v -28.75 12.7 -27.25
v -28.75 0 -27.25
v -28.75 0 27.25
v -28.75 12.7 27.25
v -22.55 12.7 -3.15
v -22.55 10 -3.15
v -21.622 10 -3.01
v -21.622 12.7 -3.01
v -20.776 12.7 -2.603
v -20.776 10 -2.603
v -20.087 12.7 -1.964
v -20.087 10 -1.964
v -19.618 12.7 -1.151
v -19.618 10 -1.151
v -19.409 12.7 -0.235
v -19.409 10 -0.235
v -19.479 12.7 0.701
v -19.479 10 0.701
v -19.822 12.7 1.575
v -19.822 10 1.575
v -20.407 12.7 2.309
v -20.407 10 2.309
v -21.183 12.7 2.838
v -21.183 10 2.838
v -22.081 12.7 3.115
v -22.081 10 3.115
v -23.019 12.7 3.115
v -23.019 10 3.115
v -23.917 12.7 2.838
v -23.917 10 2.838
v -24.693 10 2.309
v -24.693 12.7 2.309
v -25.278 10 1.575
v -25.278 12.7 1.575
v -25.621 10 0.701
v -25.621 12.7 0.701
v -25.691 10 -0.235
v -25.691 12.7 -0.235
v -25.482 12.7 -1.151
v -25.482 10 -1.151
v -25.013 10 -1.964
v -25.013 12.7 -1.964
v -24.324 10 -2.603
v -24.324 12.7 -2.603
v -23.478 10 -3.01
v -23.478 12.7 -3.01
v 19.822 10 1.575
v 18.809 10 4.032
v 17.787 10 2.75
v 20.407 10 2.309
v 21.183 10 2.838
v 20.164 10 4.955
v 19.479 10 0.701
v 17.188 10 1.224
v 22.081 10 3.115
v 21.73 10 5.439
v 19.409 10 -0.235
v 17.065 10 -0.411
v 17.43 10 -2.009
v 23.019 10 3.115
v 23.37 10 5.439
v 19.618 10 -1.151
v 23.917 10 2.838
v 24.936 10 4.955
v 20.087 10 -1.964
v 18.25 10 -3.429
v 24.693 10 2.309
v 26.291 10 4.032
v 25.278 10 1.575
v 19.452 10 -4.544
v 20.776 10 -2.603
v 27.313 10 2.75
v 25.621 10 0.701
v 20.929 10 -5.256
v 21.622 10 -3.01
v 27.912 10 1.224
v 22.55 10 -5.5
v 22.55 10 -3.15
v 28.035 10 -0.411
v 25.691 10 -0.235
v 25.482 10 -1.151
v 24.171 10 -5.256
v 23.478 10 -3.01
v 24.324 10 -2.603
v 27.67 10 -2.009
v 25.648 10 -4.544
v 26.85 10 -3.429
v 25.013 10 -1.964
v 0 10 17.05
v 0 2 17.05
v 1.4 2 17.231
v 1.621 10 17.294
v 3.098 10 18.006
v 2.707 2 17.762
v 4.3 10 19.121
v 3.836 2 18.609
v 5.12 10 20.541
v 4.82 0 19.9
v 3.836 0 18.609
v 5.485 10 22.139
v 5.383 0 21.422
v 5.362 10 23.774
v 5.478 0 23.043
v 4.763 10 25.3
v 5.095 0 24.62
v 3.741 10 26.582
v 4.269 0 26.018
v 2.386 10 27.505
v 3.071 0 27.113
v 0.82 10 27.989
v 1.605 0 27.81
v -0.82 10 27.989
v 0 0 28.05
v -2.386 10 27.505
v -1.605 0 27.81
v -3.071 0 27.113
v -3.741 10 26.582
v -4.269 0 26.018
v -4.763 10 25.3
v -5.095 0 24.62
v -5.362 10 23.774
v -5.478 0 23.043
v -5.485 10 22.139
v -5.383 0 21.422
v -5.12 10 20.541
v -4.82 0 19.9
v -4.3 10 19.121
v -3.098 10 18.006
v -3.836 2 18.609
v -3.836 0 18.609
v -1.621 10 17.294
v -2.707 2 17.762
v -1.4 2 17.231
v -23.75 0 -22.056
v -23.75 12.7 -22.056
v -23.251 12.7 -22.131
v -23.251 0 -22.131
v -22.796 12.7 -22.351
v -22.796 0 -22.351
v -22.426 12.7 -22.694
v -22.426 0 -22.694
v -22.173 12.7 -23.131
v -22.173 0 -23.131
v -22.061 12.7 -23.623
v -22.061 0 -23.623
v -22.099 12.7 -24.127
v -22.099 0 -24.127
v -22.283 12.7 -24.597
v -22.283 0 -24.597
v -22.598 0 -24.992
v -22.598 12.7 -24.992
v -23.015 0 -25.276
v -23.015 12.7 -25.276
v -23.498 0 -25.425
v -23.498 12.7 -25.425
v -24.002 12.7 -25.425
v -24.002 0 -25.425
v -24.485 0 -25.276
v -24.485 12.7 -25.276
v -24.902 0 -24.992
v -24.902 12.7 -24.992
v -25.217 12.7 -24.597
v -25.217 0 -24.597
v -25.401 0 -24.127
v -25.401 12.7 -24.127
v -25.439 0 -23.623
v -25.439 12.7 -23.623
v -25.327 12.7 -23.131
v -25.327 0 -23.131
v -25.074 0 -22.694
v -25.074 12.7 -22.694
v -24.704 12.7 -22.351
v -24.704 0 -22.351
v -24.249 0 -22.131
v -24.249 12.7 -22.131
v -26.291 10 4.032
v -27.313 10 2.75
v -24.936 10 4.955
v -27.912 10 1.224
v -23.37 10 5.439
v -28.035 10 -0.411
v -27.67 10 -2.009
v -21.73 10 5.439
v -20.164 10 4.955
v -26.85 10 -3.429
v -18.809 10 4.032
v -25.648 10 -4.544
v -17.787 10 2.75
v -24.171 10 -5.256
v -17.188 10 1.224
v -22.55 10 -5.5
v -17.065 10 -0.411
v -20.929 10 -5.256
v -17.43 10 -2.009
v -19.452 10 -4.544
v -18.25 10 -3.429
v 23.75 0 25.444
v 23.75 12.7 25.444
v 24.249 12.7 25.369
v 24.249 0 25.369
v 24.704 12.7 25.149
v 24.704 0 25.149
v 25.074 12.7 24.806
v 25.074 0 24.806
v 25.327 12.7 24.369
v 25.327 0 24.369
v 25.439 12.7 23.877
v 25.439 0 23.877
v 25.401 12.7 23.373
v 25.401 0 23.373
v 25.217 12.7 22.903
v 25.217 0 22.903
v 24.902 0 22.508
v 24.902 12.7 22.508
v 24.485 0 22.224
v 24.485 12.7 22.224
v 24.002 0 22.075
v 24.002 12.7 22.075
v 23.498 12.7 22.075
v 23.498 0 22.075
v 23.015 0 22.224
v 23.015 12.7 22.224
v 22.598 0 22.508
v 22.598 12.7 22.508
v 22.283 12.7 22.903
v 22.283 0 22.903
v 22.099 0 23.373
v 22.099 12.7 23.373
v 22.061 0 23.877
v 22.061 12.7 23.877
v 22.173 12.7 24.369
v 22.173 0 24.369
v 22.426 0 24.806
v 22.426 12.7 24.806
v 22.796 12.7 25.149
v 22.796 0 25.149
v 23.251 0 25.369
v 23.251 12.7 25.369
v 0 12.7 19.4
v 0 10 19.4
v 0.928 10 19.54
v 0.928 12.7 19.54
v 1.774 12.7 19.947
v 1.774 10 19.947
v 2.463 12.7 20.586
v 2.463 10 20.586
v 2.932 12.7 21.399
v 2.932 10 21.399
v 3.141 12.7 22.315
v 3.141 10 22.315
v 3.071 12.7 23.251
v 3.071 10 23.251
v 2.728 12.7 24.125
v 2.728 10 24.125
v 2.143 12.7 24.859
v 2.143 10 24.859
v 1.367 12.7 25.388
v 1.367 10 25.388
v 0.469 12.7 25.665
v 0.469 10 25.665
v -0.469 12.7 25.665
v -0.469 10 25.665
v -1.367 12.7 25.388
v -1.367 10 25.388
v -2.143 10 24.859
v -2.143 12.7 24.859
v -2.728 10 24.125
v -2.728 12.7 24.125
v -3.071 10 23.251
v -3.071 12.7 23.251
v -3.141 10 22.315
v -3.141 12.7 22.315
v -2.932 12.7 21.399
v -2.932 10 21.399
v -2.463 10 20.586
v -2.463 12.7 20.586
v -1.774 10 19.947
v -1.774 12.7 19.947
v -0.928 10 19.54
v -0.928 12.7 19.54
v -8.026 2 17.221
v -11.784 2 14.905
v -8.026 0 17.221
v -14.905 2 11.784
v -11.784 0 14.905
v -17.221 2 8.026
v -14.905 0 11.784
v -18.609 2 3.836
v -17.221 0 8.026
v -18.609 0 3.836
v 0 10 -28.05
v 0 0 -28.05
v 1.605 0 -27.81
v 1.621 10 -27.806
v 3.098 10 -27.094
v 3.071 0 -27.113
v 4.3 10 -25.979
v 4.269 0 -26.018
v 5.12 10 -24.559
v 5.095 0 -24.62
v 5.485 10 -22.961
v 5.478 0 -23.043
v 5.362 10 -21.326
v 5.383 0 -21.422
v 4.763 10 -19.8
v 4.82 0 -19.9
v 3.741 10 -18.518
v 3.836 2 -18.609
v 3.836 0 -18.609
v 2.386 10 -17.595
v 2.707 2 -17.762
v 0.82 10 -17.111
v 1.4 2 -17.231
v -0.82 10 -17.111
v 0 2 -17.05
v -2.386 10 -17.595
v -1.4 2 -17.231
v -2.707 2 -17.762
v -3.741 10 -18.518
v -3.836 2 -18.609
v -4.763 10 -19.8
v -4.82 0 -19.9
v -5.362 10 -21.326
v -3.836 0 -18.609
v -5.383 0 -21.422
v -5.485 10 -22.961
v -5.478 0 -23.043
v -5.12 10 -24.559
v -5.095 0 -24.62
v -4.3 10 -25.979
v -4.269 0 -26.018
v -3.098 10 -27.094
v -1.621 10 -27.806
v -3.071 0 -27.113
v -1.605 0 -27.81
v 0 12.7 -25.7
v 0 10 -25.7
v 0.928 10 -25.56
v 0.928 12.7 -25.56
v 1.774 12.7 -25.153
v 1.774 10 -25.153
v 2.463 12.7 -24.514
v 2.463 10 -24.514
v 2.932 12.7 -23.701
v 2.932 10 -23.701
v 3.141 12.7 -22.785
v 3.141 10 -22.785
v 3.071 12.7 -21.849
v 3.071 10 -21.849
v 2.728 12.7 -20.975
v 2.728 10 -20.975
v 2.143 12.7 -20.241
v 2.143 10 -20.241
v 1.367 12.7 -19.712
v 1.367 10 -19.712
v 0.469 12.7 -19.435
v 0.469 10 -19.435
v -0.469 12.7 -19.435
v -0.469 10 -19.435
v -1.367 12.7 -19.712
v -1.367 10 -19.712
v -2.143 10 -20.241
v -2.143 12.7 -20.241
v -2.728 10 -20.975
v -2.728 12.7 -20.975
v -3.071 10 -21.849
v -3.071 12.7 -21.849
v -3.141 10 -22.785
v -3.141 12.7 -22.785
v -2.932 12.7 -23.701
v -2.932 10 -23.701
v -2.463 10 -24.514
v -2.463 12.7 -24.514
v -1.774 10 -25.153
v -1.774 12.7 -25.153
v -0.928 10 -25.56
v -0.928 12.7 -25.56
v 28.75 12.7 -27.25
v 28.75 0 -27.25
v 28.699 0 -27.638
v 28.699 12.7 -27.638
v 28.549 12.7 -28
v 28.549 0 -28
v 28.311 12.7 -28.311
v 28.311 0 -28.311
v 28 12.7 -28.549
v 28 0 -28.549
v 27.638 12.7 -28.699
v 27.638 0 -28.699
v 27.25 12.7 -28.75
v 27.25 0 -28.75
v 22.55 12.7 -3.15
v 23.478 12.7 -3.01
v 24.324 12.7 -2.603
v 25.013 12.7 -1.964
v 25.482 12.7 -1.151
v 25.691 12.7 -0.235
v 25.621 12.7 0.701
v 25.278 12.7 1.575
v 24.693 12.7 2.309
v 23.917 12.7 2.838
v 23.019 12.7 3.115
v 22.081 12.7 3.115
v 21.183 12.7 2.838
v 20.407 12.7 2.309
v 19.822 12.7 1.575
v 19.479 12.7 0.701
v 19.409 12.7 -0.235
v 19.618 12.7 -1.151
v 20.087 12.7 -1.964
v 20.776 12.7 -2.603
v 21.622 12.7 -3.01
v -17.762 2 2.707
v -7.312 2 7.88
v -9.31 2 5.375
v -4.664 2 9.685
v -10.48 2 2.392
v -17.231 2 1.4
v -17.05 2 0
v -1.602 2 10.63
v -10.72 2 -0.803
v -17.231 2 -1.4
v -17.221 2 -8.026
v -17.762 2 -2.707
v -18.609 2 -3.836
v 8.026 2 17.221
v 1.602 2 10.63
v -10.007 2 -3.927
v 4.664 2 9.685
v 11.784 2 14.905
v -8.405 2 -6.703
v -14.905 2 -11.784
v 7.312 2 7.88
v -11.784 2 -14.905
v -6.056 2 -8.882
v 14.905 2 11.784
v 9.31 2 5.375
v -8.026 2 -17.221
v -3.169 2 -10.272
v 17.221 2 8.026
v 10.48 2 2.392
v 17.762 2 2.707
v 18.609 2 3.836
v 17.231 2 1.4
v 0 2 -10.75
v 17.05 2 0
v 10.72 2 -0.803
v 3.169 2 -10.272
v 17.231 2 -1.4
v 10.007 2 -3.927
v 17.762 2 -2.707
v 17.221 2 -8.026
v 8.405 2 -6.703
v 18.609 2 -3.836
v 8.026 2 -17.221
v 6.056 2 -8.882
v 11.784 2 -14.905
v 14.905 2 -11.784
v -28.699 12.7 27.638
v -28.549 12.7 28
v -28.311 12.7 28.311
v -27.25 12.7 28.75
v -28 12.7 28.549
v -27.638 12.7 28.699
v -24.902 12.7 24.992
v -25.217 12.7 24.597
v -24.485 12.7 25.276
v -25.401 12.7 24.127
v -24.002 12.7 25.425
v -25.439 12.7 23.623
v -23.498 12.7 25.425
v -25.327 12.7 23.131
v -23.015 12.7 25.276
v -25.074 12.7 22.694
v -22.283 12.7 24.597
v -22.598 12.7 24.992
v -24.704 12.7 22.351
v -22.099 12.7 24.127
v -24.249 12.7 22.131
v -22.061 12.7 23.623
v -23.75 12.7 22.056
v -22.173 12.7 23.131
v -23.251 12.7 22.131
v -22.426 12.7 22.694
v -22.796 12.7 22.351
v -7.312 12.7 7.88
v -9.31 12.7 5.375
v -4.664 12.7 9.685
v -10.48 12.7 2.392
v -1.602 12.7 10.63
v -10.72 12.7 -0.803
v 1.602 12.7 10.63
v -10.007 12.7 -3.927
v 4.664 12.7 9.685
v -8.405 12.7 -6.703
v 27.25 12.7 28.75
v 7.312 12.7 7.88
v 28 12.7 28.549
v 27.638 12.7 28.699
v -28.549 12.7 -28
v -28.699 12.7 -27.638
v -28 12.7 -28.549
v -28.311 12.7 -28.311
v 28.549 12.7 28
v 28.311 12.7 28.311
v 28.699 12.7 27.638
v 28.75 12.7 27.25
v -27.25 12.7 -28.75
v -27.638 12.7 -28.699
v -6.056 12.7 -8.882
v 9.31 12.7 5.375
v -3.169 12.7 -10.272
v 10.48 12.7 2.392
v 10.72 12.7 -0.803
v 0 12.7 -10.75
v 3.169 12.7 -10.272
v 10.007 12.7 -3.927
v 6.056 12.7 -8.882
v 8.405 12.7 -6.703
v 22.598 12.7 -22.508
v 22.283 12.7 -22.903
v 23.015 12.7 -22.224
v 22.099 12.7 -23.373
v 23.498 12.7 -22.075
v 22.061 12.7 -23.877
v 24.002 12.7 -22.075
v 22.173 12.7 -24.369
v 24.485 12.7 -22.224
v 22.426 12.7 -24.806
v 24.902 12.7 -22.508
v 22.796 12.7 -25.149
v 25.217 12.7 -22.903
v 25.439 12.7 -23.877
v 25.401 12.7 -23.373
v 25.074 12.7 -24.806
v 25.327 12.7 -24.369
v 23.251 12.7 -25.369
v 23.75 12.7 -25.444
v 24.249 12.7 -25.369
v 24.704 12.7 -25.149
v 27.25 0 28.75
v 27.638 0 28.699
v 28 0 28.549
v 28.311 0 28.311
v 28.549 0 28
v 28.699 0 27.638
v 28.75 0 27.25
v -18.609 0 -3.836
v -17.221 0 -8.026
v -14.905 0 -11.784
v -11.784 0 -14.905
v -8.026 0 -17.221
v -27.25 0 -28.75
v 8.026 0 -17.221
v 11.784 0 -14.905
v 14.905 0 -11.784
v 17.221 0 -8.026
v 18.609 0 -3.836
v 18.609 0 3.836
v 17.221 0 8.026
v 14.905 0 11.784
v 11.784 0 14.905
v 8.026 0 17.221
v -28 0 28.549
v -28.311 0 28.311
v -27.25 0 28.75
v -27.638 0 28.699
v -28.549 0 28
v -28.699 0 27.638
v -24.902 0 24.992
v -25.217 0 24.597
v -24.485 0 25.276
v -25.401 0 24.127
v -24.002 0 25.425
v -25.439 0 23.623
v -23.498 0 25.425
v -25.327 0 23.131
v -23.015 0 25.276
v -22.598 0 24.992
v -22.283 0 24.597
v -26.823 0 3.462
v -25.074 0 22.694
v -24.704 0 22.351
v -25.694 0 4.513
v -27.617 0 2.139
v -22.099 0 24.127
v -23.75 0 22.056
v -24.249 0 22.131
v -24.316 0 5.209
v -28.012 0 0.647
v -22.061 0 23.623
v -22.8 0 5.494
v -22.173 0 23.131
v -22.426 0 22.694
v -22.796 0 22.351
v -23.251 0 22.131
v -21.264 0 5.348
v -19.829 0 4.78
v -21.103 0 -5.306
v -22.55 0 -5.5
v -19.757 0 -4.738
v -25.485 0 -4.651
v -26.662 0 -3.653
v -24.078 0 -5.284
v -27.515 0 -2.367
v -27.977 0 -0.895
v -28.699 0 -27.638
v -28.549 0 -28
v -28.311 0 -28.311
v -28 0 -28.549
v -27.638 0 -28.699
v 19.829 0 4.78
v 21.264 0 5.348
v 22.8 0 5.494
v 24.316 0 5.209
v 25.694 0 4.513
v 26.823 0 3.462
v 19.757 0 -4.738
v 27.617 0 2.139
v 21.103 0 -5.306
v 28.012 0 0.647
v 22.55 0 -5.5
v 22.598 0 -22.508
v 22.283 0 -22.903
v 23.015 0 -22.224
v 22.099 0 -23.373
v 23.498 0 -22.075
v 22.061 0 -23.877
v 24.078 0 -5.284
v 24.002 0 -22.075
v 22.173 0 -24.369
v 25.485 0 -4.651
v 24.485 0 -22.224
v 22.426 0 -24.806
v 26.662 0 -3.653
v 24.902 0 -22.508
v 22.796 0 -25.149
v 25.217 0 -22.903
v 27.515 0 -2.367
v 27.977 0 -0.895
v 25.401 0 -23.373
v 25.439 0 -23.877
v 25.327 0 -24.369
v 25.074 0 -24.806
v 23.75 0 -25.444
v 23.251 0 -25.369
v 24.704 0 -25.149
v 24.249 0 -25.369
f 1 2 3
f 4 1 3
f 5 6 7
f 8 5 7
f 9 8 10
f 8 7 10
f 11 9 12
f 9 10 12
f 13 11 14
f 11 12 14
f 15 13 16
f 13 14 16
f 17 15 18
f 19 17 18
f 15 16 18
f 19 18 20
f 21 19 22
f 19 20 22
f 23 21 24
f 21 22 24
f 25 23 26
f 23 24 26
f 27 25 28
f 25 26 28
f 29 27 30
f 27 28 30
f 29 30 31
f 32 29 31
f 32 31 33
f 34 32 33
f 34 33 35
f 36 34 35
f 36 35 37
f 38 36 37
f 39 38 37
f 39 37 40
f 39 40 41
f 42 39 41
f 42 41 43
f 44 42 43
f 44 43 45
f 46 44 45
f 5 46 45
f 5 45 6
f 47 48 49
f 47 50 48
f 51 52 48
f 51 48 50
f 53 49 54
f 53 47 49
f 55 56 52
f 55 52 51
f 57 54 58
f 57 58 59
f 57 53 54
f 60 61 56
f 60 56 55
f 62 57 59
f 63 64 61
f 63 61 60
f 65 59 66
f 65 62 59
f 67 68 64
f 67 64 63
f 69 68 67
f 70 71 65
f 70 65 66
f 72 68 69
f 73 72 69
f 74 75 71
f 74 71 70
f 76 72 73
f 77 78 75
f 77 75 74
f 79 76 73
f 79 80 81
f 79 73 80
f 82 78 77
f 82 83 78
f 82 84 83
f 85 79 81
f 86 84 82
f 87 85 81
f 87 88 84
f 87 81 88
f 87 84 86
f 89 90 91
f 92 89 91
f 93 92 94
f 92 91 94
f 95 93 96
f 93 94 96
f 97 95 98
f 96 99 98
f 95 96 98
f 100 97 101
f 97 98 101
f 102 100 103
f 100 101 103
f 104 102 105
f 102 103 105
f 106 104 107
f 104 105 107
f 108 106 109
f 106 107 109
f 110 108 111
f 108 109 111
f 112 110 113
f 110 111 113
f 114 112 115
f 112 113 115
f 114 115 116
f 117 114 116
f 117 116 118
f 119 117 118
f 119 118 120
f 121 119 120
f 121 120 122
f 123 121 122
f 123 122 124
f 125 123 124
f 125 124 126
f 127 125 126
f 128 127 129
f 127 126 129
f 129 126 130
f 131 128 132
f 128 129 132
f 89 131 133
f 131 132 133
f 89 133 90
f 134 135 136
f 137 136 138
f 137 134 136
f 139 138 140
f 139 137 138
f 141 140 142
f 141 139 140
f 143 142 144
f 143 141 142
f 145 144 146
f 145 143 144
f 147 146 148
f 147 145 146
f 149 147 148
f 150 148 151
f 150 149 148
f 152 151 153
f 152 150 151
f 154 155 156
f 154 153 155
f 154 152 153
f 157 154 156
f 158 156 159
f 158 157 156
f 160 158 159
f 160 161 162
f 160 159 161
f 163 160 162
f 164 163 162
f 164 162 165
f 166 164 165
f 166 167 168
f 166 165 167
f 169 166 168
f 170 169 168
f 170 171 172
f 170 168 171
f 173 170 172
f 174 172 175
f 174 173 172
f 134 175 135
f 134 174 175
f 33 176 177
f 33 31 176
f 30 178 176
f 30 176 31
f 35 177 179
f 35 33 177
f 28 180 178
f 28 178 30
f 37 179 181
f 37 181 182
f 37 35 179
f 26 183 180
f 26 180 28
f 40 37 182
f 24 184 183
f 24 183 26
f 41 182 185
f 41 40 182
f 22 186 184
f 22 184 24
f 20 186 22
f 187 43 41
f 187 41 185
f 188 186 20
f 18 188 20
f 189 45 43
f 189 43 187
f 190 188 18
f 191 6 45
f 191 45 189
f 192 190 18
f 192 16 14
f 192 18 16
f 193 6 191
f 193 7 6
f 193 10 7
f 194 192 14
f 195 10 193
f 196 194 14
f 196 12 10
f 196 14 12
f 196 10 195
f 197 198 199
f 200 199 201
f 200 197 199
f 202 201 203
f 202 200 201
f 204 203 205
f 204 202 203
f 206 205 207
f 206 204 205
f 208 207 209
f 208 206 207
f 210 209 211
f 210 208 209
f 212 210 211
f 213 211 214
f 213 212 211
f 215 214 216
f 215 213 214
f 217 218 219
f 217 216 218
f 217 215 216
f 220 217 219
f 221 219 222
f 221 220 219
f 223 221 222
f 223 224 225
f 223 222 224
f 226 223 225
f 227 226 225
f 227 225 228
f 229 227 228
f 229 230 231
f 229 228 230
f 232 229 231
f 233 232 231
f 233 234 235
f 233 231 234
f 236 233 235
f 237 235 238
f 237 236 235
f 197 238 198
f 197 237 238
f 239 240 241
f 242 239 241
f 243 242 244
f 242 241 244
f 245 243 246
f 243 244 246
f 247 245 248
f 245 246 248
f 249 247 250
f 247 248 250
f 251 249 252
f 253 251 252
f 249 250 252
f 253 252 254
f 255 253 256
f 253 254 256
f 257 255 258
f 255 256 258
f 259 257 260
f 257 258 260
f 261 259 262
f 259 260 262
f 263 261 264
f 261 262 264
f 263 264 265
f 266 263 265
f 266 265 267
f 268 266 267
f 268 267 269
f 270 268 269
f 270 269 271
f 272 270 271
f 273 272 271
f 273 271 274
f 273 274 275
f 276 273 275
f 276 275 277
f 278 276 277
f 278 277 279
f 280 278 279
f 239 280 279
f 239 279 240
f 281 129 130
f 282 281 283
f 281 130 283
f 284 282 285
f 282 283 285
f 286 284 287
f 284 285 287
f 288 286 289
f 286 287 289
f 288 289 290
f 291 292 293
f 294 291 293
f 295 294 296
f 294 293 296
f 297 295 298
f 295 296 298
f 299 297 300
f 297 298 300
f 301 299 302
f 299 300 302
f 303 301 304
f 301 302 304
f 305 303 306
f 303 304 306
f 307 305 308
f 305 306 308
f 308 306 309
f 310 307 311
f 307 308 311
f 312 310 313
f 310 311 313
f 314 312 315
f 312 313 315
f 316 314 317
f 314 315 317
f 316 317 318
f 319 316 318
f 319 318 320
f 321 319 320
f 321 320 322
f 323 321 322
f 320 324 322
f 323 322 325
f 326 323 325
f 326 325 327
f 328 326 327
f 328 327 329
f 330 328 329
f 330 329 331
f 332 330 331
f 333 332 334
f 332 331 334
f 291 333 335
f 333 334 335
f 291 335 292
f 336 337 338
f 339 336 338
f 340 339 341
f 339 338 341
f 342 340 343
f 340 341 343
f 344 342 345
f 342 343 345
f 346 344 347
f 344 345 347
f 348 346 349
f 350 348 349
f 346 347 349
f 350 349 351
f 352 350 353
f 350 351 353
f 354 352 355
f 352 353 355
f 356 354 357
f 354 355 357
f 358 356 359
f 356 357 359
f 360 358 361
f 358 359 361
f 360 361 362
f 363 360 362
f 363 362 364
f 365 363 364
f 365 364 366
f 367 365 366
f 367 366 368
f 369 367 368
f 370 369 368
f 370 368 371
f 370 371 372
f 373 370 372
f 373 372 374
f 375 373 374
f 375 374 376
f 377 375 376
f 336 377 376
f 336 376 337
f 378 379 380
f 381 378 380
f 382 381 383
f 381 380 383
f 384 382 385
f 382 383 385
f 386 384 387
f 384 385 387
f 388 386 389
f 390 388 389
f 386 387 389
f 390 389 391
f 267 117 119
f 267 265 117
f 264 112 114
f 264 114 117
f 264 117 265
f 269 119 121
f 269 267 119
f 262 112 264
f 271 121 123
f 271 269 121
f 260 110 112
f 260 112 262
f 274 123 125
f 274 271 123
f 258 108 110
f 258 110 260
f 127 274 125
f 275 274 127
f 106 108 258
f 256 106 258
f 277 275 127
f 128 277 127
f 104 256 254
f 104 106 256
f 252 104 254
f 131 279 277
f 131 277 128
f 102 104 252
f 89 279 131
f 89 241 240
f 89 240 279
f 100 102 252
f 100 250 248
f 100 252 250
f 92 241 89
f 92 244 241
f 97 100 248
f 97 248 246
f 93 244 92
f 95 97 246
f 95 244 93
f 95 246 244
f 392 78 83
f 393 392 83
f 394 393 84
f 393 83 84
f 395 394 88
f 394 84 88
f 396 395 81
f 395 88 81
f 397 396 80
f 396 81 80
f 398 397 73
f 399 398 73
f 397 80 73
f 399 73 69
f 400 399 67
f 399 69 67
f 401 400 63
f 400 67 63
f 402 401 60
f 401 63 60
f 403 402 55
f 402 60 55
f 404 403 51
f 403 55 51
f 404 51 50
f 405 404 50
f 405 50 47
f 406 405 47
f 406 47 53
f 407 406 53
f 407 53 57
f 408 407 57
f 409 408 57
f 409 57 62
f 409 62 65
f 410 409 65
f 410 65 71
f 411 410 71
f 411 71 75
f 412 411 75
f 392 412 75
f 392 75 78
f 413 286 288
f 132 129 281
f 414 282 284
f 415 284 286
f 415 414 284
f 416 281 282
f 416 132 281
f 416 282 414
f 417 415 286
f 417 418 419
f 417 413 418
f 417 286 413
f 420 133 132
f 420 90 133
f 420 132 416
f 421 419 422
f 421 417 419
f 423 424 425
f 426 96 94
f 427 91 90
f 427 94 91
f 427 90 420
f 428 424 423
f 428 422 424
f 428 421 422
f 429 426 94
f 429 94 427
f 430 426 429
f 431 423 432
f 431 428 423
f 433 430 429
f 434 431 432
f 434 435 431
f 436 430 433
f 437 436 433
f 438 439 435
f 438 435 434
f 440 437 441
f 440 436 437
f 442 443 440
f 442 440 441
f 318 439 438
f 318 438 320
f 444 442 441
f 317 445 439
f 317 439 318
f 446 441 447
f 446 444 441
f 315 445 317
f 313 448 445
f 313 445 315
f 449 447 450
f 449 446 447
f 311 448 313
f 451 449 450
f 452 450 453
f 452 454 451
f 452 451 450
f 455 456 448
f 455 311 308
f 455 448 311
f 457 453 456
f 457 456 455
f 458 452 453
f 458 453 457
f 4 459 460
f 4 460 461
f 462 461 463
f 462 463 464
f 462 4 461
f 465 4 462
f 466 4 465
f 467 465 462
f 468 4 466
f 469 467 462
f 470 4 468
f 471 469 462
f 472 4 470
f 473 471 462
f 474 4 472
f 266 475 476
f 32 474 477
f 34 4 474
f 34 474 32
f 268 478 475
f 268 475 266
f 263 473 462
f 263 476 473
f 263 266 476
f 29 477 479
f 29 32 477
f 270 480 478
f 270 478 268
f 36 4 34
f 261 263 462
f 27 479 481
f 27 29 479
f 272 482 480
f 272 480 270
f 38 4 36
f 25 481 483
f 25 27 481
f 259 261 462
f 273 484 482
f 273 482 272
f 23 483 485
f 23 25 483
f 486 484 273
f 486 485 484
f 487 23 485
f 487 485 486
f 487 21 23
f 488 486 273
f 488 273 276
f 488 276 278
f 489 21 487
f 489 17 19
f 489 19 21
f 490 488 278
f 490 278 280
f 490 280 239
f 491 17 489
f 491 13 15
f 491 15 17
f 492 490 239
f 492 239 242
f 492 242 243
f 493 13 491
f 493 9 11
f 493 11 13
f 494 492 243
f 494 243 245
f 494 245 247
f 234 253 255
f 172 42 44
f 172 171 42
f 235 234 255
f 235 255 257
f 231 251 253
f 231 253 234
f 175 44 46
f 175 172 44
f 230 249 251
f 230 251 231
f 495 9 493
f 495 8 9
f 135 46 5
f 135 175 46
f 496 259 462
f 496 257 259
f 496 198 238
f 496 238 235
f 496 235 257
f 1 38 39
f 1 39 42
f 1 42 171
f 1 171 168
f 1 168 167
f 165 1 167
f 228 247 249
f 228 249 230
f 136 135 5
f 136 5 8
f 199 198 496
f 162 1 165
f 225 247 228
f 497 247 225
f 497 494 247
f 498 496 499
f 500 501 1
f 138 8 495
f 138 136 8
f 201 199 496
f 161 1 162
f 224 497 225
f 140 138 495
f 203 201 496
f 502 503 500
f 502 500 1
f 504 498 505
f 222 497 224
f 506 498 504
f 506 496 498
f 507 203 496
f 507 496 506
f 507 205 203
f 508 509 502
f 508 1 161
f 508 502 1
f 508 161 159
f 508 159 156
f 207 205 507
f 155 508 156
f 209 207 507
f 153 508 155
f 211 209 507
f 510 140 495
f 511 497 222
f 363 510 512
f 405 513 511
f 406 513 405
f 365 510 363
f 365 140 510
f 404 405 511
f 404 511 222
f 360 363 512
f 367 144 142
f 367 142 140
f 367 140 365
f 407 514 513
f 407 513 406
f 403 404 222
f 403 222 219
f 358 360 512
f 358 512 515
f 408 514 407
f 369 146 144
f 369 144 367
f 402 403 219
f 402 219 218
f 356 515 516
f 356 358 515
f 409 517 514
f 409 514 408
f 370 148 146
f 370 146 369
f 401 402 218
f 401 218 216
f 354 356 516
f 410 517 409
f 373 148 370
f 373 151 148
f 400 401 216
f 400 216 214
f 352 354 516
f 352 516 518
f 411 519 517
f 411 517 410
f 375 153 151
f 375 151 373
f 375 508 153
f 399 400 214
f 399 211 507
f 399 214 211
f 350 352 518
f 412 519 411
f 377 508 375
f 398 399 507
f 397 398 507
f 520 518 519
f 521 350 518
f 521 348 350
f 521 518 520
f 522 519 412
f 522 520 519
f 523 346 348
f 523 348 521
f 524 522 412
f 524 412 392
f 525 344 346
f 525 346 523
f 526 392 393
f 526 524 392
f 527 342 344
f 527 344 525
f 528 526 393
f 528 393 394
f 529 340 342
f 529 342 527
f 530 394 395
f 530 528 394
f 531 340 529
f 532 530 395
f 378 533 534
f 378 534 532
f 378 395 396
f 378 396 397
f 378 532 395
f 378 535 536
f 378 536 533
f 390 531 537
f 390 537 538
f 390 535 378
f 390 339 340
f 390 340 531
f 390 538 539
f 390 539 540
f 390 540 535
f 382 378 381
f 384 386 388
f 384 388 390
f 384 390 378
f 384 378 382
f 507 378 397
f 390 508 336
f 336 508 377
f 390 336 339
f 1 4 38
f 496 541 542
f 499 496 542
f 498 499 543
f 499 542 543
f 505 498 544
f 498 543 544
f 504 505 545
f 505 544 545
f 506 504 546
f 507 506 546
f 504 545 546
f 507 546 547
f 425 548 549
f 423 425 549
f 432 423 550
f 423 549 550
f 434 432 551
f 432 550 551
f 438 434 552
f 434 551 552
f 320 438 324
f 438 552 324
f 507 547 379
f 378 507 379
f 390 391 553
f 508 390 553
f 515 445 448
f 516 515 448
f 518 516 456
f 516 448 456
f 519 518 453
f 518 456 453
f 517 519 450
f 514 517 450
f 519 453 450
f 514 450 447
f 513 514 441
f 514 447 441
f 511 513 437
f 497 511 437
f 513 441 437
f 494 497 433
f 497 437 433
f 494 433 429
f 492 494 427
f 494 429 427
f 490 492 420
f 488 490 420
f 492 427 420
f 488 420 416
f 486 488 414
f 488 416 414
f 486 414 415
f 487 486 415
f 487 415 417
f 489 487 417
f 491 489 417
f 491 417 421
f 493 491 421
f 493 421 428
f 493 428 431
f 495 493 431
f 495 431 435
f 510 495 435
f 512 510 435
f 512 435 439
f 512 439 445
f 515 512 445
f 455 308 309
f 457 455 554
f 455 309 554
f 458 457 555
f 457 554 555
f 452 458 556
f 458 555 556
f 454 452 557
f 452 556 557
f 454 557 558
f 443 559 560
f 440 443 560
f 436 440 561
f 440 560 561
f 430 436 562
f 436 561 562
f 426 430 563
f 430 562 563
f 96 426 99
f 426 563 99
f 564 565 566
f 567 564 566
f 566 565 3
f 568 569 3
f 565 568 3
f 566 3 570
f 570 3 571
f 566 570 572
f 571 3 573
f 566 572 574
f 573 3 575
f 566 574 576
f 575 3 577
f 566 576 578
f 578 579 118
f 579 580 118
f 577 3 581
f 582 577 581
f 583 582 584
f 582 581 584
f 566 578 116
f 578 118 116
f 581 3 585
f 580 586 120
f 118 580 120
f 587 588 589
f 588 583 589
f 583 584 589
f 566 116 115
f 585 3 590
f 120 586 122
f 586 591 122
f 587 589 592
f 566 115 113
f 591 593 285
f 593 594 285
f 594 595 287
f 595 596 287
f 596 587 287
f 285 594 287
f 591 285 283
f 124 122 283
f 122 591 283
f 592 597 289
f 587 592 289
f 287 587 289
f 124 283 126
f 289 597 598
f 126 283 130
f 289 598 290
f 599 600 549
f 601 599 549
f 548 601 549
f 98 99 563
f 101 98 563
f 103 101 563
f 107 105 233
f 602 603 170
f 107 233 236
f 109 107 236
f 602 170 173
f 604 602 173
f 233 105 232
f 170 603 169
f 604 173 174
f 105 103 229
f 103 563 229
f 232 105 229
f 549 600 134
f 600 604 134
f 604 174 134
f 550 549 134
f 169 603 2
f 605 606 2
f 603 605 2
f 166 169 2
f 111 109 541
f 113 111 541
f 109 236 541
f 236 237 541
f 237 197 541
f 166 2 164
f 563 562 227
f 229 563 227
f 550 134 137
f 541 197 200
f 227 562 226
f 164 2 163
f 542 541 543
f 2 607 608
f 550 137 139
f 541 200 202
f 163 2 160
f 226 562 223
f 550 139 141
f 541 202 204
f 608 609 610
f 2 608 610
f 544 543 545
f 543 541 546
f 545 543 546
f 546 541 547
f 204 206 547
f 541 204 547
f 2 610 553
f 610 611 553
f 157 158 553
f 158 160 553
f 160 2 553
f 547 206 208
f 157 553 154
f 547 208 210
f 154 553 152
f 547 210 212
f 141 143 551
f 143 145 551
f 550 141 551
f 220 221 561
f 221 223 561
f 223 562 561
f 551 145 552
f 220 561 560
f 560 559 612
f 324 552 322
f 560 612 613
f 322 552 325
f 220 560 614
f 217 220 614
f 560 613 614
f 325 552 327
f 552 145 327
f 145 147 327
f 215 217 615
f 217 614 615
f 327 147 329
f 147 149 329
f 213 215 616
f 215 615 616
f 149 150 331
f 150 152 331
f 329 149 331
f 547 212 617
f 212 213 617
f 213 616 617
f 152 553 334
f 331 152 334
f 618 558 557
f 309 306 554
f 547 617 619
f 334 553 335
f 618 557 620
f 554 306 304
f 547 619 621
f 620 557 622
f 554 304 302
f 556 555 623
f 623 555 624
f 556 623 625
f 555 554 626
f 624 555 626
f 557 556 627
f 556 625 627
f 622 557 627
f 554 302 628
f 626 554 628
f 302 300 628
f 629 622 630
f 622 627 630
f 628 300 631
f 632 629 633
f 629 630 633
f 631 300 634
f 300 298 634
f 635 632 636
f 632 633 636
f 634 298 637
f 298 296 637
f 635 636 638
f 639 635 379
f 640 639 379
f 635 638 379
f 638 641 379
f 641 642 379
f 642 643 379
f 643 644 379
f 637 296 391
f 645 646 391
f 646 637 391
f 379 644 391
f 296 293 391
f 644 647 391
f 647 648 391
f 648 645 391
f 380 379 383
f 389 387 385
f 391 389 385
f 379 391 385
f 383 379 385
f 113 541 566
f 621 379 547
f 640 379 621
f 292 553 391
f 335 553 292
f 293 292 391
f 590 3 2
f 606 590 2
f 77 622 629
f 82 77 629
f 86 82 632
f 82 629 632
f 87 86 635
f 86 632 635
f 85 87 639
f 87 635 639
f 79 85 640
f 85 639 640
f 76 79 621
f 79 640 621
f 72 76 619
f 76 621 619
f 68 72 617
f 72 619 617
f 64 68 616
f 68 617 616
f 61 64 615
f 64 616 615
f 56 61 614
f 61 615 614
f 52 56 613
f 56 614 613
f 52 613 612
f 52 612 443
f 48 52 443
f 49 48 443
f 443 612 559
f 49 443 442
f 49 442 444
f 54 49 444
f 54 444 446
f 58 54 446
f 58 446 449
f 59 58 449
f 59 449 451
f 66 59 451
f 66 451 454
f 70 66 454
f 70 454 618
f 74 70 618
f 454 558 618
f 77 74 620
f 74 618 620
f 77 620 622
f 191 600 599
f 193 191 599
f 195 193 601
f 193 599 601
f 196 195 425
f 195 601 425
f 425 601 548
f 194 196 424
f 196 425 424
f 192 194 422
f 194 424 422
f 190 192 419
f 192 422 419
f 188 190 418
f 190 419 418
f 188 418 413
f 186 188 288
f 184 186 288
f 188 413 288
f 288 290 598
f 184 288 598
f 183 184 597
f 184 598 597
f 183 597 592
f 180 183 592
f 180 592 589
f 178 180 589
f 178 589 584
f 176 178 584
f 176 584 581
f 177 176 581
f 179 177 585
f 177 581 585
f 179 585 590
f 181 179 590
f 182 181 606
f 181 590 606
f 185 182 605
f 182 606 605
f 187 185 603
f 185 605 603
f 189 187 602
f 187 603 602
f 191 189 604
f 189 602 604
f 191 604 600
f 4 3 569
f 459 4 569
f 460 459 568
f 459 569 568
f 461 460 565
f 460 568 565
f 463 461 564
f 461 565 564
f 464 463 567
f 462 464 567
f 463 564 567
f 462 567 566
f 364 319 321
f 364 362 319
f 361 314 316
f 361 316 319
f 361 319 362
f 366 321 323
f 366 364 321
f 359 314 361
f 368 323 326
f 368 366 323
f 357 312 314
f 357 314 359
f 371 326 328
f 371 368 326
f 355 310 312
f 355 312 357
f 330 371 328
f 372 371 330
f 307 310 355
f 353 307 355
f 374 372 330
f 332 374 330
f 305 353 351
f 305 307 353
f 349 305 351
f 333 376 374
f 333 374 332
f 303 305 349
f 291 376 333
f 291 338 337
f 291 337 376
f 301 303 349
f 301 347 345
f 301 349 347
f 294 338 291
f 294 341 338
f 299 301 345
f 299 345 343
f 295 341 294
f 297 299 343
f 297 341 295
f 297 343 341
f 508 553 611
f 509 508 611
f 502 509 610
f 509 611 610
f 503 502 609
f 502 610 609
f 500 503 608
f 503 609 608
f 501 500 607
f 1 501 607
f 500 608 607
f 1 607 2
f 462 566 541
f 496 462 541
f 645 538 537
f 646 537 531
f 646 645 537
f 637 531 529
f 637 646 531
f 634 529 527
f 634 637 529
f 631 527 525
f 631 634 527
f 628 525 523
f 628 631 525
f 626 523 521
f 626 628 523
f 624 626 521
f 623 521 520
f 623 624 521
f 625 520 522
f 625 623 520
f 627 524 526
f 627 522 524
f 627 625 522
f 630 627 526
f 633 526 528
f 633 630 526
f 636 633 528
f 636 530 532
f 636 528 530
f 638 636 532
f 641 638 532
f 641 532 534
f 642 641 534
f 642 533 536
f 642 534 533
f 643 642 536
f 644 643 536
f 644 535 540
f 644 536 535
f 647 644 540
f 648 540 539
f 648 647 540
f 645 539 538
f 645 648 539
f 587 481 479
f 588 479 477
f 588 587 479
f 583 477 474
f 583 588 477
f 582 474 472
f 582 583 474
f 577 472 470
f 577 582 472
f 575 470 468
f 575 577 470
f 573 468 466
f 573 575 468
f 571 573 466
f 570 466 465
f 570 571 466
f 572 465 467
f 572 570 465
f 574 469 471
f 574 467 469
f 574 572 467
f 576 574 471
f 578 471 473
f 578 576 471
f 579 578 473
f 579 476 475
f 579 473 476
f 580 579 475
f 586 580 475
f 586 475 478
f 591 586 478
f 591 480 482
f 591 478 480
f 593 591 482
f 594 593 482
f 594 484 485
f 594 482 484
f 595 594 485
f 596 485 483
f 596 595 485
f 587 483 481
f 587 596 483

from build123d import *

# Parameters (mm, degrees)
SALIENTE_EXTRUIR1_DEPTH = 12.7
CROQUIS1_4_OUTSIDE_W    = 75.96
CROQUIS1_4_OUTSIDE_H    = 75.96
CROQUIS1_4_OUTSIDE_R    = 1.693796282
CORTAR_EXTRUIR1_DEPTH   = 29.7
CROQUIS2_R              = 19
CORTAR_EXTRUIR2_DEPTH   = 2
CROQUIS3_R              = 10.75
CORTAR_EXTRUIR3_DEPTH   = 43.043013688
CROQUIS4_R              = 5.5
CORTAR_EXTRUIR4_DEPTH   = 10
CROQUIS6_R              = 3.15
CORTAR_EXTRUIR5_DEPTH   = 42.870335561


with BuildPart() as part:
    # Croquis1 → Saliente-Extruir1 (new body)
    with BuildSketch(Plane(origin=(0, 0, 0), x_dir=(1, 0, 0), z_dir=(0, 1, 0))):
        with BuildLine():
            Line((-27.25, -28.75), (27.25, -28.75))
            ThreePointArc((27.25, -28.75), (28.310660172, -28.310660172), (28.75, -27.25))
            Line((28.75, -27.25), (28.75, 27.25))
            ThreePointArc((28.75, 27.25), (28.310660172, 28.310660172), (27.25, 28.75))
            Line((27.25, 28.75), (-27.25, 28.75))
            ThreePointArc((-27.25, 28.75), (-28.310660172, 28.310660172), (-28.75, 27.25))
            Line((-28.75, 27.25), (-28.75, -27.25))
            ThreePointArc((-28.75, -27.25), (-28.310660172, -28.310660172), (-27.25, -28.75))
        make_face()
    extrude(amount=SALIENTE_EXTRUIR1_DEPTH)

    # Croquis1<4> outside → Cortar-Extruir1 (cut)
    # profile 1 of 5: a face of its own
    with BuildSketch(Plane(origin=(0, 0, 0), x_dir=(1, 0, 0), z_dir=(0, 1, 0))):
        Rectangle(CROQUIS1_4_OUTSIDE_W, CROQUIS1_4_OUTSIDE_H)
        with BuildLine():
            Line((-27.25, -28.75), (27.25, -28.75))
            ThreePointArc((27.25, -28.75), (28.310660172, -28.310660172), (28.75, -27.25))
            Line((28.75, -27.25), (28.75, 27.25))
            ThreePointArc((28.75, 27.25), (28.310660172, 28.310660172), (27.25, 28.75))
            Line((27.25, 28.75), (-27.25, 28.75))
            ThreePointArc((-27.25, 28.75), (-28.310660172, 28.310660172), (-28.75, 27.25))
            Line((-28.75, 27.25), (-28.75, -27.25))
            ThreePointArc((-28.75, -27.25), (-28.310660172, -28.310660172), (-27.25, -28.75))
        make_face(mode=Mode.SUBTRACT)
    # profile 2 of 5: a face of its own
    with BuildSketch(Plane(origin=(0, 0, 0), x_dir=(1, 0, 0), z_dir=(0, 1, 0))):
        with Locations((-23.75, 23.75)):
            Circle(CROQUIS1_4_OUTSIDE_R)
    # profile 3 of 5: a face of its own
    with BuildSketch(Plane(origin=(0, 0, 0), x_dir=(1, 0, 0), z_dir=(0, 1, 0))):
        with Locations((23.75, 23.75)):
            Circle(CROQUIS1_4_OUTSIDE_R)
    # profile 4 of 5: a face of its own
    with BuildSketch(Plane(origin=(0, 0, 0), x_dir=(1, 0, 0), z_dir=(0, 1, 0))):
        with Locations((23.75, -23.75)):
            Circle(CROQUIS1_4_OUTSIDE_R)
    # profile 5 of 5: a face of its own
    with BuildSketch(Plane(origin=(0, 0, 0), x_dir=(1, 0, 0), z_dir=(0, 1, 0))):
        with Locations((-23.75, -23.75)):
            Circle(CROQUIS1_4_OUTSIDE_R)
    extrude(amount=CORTAR_EXTRUIR1_DEPTH, mode=Mode.SUBTRACT)

    # Croquis2 → Cortar-Extruir2 (cut)
    with BuildSketch(Plane.XZ):
        Circle(CROQUIS2_R)
    extrude(amount=-CORTAR_EXTRUIR2_DEPTH, mode=Mode.SUBTRACT)

    # Croquis3 → Cortar-Extruir3 (cut, through all)
    with BuildSketch(Plane.XZ.offset(-2)):
        Circle(CROQUIS3_R)
    extrude(amount=-CORTAR_EXTRUIR3_DEPTH, mode=Mode.SUBTRACT)

    # Croquis4 → Cortar-Extruir4 (cut)
    with BuildSketch(Plane.XZ):
        with Locations((22.55, 0)):
            Circle(CROQUIS4_R)
        with Locations((0, -22.55)):
            Circle(CROQUIS4_R)
        with Locations((-22.55, 0)):
            Circle(CROQUIS4_R)
        with Locations((0, 22.55)):
            Circle(CROQUIS4_R)
    extrude(amount=-CORTAR_EXTRUIR4_DEPTH, mode=Mode.SUBTRACT)

    # Croquis6 → Cortar-Extruir5 (cut, through all)
    with BuildSketch(Plane.XZ.offset(-10)):
        with Locations((22.55, 0)):
            Circle(CROQUIS6_R)
        with Locations((0, -22.55)):
            Circle(CROQUIS6_R)
        with Locations((-22.55, 0)):
            Circle(CROQUIS6_R)
        with Locations((0, 22.55)):
            Circle(CROQUIS6_R)
    extrude(amount=-CORTAR_EXTRUIR5_DEPTH, mode=Mode.SUBTRACT)


solid = part.part
